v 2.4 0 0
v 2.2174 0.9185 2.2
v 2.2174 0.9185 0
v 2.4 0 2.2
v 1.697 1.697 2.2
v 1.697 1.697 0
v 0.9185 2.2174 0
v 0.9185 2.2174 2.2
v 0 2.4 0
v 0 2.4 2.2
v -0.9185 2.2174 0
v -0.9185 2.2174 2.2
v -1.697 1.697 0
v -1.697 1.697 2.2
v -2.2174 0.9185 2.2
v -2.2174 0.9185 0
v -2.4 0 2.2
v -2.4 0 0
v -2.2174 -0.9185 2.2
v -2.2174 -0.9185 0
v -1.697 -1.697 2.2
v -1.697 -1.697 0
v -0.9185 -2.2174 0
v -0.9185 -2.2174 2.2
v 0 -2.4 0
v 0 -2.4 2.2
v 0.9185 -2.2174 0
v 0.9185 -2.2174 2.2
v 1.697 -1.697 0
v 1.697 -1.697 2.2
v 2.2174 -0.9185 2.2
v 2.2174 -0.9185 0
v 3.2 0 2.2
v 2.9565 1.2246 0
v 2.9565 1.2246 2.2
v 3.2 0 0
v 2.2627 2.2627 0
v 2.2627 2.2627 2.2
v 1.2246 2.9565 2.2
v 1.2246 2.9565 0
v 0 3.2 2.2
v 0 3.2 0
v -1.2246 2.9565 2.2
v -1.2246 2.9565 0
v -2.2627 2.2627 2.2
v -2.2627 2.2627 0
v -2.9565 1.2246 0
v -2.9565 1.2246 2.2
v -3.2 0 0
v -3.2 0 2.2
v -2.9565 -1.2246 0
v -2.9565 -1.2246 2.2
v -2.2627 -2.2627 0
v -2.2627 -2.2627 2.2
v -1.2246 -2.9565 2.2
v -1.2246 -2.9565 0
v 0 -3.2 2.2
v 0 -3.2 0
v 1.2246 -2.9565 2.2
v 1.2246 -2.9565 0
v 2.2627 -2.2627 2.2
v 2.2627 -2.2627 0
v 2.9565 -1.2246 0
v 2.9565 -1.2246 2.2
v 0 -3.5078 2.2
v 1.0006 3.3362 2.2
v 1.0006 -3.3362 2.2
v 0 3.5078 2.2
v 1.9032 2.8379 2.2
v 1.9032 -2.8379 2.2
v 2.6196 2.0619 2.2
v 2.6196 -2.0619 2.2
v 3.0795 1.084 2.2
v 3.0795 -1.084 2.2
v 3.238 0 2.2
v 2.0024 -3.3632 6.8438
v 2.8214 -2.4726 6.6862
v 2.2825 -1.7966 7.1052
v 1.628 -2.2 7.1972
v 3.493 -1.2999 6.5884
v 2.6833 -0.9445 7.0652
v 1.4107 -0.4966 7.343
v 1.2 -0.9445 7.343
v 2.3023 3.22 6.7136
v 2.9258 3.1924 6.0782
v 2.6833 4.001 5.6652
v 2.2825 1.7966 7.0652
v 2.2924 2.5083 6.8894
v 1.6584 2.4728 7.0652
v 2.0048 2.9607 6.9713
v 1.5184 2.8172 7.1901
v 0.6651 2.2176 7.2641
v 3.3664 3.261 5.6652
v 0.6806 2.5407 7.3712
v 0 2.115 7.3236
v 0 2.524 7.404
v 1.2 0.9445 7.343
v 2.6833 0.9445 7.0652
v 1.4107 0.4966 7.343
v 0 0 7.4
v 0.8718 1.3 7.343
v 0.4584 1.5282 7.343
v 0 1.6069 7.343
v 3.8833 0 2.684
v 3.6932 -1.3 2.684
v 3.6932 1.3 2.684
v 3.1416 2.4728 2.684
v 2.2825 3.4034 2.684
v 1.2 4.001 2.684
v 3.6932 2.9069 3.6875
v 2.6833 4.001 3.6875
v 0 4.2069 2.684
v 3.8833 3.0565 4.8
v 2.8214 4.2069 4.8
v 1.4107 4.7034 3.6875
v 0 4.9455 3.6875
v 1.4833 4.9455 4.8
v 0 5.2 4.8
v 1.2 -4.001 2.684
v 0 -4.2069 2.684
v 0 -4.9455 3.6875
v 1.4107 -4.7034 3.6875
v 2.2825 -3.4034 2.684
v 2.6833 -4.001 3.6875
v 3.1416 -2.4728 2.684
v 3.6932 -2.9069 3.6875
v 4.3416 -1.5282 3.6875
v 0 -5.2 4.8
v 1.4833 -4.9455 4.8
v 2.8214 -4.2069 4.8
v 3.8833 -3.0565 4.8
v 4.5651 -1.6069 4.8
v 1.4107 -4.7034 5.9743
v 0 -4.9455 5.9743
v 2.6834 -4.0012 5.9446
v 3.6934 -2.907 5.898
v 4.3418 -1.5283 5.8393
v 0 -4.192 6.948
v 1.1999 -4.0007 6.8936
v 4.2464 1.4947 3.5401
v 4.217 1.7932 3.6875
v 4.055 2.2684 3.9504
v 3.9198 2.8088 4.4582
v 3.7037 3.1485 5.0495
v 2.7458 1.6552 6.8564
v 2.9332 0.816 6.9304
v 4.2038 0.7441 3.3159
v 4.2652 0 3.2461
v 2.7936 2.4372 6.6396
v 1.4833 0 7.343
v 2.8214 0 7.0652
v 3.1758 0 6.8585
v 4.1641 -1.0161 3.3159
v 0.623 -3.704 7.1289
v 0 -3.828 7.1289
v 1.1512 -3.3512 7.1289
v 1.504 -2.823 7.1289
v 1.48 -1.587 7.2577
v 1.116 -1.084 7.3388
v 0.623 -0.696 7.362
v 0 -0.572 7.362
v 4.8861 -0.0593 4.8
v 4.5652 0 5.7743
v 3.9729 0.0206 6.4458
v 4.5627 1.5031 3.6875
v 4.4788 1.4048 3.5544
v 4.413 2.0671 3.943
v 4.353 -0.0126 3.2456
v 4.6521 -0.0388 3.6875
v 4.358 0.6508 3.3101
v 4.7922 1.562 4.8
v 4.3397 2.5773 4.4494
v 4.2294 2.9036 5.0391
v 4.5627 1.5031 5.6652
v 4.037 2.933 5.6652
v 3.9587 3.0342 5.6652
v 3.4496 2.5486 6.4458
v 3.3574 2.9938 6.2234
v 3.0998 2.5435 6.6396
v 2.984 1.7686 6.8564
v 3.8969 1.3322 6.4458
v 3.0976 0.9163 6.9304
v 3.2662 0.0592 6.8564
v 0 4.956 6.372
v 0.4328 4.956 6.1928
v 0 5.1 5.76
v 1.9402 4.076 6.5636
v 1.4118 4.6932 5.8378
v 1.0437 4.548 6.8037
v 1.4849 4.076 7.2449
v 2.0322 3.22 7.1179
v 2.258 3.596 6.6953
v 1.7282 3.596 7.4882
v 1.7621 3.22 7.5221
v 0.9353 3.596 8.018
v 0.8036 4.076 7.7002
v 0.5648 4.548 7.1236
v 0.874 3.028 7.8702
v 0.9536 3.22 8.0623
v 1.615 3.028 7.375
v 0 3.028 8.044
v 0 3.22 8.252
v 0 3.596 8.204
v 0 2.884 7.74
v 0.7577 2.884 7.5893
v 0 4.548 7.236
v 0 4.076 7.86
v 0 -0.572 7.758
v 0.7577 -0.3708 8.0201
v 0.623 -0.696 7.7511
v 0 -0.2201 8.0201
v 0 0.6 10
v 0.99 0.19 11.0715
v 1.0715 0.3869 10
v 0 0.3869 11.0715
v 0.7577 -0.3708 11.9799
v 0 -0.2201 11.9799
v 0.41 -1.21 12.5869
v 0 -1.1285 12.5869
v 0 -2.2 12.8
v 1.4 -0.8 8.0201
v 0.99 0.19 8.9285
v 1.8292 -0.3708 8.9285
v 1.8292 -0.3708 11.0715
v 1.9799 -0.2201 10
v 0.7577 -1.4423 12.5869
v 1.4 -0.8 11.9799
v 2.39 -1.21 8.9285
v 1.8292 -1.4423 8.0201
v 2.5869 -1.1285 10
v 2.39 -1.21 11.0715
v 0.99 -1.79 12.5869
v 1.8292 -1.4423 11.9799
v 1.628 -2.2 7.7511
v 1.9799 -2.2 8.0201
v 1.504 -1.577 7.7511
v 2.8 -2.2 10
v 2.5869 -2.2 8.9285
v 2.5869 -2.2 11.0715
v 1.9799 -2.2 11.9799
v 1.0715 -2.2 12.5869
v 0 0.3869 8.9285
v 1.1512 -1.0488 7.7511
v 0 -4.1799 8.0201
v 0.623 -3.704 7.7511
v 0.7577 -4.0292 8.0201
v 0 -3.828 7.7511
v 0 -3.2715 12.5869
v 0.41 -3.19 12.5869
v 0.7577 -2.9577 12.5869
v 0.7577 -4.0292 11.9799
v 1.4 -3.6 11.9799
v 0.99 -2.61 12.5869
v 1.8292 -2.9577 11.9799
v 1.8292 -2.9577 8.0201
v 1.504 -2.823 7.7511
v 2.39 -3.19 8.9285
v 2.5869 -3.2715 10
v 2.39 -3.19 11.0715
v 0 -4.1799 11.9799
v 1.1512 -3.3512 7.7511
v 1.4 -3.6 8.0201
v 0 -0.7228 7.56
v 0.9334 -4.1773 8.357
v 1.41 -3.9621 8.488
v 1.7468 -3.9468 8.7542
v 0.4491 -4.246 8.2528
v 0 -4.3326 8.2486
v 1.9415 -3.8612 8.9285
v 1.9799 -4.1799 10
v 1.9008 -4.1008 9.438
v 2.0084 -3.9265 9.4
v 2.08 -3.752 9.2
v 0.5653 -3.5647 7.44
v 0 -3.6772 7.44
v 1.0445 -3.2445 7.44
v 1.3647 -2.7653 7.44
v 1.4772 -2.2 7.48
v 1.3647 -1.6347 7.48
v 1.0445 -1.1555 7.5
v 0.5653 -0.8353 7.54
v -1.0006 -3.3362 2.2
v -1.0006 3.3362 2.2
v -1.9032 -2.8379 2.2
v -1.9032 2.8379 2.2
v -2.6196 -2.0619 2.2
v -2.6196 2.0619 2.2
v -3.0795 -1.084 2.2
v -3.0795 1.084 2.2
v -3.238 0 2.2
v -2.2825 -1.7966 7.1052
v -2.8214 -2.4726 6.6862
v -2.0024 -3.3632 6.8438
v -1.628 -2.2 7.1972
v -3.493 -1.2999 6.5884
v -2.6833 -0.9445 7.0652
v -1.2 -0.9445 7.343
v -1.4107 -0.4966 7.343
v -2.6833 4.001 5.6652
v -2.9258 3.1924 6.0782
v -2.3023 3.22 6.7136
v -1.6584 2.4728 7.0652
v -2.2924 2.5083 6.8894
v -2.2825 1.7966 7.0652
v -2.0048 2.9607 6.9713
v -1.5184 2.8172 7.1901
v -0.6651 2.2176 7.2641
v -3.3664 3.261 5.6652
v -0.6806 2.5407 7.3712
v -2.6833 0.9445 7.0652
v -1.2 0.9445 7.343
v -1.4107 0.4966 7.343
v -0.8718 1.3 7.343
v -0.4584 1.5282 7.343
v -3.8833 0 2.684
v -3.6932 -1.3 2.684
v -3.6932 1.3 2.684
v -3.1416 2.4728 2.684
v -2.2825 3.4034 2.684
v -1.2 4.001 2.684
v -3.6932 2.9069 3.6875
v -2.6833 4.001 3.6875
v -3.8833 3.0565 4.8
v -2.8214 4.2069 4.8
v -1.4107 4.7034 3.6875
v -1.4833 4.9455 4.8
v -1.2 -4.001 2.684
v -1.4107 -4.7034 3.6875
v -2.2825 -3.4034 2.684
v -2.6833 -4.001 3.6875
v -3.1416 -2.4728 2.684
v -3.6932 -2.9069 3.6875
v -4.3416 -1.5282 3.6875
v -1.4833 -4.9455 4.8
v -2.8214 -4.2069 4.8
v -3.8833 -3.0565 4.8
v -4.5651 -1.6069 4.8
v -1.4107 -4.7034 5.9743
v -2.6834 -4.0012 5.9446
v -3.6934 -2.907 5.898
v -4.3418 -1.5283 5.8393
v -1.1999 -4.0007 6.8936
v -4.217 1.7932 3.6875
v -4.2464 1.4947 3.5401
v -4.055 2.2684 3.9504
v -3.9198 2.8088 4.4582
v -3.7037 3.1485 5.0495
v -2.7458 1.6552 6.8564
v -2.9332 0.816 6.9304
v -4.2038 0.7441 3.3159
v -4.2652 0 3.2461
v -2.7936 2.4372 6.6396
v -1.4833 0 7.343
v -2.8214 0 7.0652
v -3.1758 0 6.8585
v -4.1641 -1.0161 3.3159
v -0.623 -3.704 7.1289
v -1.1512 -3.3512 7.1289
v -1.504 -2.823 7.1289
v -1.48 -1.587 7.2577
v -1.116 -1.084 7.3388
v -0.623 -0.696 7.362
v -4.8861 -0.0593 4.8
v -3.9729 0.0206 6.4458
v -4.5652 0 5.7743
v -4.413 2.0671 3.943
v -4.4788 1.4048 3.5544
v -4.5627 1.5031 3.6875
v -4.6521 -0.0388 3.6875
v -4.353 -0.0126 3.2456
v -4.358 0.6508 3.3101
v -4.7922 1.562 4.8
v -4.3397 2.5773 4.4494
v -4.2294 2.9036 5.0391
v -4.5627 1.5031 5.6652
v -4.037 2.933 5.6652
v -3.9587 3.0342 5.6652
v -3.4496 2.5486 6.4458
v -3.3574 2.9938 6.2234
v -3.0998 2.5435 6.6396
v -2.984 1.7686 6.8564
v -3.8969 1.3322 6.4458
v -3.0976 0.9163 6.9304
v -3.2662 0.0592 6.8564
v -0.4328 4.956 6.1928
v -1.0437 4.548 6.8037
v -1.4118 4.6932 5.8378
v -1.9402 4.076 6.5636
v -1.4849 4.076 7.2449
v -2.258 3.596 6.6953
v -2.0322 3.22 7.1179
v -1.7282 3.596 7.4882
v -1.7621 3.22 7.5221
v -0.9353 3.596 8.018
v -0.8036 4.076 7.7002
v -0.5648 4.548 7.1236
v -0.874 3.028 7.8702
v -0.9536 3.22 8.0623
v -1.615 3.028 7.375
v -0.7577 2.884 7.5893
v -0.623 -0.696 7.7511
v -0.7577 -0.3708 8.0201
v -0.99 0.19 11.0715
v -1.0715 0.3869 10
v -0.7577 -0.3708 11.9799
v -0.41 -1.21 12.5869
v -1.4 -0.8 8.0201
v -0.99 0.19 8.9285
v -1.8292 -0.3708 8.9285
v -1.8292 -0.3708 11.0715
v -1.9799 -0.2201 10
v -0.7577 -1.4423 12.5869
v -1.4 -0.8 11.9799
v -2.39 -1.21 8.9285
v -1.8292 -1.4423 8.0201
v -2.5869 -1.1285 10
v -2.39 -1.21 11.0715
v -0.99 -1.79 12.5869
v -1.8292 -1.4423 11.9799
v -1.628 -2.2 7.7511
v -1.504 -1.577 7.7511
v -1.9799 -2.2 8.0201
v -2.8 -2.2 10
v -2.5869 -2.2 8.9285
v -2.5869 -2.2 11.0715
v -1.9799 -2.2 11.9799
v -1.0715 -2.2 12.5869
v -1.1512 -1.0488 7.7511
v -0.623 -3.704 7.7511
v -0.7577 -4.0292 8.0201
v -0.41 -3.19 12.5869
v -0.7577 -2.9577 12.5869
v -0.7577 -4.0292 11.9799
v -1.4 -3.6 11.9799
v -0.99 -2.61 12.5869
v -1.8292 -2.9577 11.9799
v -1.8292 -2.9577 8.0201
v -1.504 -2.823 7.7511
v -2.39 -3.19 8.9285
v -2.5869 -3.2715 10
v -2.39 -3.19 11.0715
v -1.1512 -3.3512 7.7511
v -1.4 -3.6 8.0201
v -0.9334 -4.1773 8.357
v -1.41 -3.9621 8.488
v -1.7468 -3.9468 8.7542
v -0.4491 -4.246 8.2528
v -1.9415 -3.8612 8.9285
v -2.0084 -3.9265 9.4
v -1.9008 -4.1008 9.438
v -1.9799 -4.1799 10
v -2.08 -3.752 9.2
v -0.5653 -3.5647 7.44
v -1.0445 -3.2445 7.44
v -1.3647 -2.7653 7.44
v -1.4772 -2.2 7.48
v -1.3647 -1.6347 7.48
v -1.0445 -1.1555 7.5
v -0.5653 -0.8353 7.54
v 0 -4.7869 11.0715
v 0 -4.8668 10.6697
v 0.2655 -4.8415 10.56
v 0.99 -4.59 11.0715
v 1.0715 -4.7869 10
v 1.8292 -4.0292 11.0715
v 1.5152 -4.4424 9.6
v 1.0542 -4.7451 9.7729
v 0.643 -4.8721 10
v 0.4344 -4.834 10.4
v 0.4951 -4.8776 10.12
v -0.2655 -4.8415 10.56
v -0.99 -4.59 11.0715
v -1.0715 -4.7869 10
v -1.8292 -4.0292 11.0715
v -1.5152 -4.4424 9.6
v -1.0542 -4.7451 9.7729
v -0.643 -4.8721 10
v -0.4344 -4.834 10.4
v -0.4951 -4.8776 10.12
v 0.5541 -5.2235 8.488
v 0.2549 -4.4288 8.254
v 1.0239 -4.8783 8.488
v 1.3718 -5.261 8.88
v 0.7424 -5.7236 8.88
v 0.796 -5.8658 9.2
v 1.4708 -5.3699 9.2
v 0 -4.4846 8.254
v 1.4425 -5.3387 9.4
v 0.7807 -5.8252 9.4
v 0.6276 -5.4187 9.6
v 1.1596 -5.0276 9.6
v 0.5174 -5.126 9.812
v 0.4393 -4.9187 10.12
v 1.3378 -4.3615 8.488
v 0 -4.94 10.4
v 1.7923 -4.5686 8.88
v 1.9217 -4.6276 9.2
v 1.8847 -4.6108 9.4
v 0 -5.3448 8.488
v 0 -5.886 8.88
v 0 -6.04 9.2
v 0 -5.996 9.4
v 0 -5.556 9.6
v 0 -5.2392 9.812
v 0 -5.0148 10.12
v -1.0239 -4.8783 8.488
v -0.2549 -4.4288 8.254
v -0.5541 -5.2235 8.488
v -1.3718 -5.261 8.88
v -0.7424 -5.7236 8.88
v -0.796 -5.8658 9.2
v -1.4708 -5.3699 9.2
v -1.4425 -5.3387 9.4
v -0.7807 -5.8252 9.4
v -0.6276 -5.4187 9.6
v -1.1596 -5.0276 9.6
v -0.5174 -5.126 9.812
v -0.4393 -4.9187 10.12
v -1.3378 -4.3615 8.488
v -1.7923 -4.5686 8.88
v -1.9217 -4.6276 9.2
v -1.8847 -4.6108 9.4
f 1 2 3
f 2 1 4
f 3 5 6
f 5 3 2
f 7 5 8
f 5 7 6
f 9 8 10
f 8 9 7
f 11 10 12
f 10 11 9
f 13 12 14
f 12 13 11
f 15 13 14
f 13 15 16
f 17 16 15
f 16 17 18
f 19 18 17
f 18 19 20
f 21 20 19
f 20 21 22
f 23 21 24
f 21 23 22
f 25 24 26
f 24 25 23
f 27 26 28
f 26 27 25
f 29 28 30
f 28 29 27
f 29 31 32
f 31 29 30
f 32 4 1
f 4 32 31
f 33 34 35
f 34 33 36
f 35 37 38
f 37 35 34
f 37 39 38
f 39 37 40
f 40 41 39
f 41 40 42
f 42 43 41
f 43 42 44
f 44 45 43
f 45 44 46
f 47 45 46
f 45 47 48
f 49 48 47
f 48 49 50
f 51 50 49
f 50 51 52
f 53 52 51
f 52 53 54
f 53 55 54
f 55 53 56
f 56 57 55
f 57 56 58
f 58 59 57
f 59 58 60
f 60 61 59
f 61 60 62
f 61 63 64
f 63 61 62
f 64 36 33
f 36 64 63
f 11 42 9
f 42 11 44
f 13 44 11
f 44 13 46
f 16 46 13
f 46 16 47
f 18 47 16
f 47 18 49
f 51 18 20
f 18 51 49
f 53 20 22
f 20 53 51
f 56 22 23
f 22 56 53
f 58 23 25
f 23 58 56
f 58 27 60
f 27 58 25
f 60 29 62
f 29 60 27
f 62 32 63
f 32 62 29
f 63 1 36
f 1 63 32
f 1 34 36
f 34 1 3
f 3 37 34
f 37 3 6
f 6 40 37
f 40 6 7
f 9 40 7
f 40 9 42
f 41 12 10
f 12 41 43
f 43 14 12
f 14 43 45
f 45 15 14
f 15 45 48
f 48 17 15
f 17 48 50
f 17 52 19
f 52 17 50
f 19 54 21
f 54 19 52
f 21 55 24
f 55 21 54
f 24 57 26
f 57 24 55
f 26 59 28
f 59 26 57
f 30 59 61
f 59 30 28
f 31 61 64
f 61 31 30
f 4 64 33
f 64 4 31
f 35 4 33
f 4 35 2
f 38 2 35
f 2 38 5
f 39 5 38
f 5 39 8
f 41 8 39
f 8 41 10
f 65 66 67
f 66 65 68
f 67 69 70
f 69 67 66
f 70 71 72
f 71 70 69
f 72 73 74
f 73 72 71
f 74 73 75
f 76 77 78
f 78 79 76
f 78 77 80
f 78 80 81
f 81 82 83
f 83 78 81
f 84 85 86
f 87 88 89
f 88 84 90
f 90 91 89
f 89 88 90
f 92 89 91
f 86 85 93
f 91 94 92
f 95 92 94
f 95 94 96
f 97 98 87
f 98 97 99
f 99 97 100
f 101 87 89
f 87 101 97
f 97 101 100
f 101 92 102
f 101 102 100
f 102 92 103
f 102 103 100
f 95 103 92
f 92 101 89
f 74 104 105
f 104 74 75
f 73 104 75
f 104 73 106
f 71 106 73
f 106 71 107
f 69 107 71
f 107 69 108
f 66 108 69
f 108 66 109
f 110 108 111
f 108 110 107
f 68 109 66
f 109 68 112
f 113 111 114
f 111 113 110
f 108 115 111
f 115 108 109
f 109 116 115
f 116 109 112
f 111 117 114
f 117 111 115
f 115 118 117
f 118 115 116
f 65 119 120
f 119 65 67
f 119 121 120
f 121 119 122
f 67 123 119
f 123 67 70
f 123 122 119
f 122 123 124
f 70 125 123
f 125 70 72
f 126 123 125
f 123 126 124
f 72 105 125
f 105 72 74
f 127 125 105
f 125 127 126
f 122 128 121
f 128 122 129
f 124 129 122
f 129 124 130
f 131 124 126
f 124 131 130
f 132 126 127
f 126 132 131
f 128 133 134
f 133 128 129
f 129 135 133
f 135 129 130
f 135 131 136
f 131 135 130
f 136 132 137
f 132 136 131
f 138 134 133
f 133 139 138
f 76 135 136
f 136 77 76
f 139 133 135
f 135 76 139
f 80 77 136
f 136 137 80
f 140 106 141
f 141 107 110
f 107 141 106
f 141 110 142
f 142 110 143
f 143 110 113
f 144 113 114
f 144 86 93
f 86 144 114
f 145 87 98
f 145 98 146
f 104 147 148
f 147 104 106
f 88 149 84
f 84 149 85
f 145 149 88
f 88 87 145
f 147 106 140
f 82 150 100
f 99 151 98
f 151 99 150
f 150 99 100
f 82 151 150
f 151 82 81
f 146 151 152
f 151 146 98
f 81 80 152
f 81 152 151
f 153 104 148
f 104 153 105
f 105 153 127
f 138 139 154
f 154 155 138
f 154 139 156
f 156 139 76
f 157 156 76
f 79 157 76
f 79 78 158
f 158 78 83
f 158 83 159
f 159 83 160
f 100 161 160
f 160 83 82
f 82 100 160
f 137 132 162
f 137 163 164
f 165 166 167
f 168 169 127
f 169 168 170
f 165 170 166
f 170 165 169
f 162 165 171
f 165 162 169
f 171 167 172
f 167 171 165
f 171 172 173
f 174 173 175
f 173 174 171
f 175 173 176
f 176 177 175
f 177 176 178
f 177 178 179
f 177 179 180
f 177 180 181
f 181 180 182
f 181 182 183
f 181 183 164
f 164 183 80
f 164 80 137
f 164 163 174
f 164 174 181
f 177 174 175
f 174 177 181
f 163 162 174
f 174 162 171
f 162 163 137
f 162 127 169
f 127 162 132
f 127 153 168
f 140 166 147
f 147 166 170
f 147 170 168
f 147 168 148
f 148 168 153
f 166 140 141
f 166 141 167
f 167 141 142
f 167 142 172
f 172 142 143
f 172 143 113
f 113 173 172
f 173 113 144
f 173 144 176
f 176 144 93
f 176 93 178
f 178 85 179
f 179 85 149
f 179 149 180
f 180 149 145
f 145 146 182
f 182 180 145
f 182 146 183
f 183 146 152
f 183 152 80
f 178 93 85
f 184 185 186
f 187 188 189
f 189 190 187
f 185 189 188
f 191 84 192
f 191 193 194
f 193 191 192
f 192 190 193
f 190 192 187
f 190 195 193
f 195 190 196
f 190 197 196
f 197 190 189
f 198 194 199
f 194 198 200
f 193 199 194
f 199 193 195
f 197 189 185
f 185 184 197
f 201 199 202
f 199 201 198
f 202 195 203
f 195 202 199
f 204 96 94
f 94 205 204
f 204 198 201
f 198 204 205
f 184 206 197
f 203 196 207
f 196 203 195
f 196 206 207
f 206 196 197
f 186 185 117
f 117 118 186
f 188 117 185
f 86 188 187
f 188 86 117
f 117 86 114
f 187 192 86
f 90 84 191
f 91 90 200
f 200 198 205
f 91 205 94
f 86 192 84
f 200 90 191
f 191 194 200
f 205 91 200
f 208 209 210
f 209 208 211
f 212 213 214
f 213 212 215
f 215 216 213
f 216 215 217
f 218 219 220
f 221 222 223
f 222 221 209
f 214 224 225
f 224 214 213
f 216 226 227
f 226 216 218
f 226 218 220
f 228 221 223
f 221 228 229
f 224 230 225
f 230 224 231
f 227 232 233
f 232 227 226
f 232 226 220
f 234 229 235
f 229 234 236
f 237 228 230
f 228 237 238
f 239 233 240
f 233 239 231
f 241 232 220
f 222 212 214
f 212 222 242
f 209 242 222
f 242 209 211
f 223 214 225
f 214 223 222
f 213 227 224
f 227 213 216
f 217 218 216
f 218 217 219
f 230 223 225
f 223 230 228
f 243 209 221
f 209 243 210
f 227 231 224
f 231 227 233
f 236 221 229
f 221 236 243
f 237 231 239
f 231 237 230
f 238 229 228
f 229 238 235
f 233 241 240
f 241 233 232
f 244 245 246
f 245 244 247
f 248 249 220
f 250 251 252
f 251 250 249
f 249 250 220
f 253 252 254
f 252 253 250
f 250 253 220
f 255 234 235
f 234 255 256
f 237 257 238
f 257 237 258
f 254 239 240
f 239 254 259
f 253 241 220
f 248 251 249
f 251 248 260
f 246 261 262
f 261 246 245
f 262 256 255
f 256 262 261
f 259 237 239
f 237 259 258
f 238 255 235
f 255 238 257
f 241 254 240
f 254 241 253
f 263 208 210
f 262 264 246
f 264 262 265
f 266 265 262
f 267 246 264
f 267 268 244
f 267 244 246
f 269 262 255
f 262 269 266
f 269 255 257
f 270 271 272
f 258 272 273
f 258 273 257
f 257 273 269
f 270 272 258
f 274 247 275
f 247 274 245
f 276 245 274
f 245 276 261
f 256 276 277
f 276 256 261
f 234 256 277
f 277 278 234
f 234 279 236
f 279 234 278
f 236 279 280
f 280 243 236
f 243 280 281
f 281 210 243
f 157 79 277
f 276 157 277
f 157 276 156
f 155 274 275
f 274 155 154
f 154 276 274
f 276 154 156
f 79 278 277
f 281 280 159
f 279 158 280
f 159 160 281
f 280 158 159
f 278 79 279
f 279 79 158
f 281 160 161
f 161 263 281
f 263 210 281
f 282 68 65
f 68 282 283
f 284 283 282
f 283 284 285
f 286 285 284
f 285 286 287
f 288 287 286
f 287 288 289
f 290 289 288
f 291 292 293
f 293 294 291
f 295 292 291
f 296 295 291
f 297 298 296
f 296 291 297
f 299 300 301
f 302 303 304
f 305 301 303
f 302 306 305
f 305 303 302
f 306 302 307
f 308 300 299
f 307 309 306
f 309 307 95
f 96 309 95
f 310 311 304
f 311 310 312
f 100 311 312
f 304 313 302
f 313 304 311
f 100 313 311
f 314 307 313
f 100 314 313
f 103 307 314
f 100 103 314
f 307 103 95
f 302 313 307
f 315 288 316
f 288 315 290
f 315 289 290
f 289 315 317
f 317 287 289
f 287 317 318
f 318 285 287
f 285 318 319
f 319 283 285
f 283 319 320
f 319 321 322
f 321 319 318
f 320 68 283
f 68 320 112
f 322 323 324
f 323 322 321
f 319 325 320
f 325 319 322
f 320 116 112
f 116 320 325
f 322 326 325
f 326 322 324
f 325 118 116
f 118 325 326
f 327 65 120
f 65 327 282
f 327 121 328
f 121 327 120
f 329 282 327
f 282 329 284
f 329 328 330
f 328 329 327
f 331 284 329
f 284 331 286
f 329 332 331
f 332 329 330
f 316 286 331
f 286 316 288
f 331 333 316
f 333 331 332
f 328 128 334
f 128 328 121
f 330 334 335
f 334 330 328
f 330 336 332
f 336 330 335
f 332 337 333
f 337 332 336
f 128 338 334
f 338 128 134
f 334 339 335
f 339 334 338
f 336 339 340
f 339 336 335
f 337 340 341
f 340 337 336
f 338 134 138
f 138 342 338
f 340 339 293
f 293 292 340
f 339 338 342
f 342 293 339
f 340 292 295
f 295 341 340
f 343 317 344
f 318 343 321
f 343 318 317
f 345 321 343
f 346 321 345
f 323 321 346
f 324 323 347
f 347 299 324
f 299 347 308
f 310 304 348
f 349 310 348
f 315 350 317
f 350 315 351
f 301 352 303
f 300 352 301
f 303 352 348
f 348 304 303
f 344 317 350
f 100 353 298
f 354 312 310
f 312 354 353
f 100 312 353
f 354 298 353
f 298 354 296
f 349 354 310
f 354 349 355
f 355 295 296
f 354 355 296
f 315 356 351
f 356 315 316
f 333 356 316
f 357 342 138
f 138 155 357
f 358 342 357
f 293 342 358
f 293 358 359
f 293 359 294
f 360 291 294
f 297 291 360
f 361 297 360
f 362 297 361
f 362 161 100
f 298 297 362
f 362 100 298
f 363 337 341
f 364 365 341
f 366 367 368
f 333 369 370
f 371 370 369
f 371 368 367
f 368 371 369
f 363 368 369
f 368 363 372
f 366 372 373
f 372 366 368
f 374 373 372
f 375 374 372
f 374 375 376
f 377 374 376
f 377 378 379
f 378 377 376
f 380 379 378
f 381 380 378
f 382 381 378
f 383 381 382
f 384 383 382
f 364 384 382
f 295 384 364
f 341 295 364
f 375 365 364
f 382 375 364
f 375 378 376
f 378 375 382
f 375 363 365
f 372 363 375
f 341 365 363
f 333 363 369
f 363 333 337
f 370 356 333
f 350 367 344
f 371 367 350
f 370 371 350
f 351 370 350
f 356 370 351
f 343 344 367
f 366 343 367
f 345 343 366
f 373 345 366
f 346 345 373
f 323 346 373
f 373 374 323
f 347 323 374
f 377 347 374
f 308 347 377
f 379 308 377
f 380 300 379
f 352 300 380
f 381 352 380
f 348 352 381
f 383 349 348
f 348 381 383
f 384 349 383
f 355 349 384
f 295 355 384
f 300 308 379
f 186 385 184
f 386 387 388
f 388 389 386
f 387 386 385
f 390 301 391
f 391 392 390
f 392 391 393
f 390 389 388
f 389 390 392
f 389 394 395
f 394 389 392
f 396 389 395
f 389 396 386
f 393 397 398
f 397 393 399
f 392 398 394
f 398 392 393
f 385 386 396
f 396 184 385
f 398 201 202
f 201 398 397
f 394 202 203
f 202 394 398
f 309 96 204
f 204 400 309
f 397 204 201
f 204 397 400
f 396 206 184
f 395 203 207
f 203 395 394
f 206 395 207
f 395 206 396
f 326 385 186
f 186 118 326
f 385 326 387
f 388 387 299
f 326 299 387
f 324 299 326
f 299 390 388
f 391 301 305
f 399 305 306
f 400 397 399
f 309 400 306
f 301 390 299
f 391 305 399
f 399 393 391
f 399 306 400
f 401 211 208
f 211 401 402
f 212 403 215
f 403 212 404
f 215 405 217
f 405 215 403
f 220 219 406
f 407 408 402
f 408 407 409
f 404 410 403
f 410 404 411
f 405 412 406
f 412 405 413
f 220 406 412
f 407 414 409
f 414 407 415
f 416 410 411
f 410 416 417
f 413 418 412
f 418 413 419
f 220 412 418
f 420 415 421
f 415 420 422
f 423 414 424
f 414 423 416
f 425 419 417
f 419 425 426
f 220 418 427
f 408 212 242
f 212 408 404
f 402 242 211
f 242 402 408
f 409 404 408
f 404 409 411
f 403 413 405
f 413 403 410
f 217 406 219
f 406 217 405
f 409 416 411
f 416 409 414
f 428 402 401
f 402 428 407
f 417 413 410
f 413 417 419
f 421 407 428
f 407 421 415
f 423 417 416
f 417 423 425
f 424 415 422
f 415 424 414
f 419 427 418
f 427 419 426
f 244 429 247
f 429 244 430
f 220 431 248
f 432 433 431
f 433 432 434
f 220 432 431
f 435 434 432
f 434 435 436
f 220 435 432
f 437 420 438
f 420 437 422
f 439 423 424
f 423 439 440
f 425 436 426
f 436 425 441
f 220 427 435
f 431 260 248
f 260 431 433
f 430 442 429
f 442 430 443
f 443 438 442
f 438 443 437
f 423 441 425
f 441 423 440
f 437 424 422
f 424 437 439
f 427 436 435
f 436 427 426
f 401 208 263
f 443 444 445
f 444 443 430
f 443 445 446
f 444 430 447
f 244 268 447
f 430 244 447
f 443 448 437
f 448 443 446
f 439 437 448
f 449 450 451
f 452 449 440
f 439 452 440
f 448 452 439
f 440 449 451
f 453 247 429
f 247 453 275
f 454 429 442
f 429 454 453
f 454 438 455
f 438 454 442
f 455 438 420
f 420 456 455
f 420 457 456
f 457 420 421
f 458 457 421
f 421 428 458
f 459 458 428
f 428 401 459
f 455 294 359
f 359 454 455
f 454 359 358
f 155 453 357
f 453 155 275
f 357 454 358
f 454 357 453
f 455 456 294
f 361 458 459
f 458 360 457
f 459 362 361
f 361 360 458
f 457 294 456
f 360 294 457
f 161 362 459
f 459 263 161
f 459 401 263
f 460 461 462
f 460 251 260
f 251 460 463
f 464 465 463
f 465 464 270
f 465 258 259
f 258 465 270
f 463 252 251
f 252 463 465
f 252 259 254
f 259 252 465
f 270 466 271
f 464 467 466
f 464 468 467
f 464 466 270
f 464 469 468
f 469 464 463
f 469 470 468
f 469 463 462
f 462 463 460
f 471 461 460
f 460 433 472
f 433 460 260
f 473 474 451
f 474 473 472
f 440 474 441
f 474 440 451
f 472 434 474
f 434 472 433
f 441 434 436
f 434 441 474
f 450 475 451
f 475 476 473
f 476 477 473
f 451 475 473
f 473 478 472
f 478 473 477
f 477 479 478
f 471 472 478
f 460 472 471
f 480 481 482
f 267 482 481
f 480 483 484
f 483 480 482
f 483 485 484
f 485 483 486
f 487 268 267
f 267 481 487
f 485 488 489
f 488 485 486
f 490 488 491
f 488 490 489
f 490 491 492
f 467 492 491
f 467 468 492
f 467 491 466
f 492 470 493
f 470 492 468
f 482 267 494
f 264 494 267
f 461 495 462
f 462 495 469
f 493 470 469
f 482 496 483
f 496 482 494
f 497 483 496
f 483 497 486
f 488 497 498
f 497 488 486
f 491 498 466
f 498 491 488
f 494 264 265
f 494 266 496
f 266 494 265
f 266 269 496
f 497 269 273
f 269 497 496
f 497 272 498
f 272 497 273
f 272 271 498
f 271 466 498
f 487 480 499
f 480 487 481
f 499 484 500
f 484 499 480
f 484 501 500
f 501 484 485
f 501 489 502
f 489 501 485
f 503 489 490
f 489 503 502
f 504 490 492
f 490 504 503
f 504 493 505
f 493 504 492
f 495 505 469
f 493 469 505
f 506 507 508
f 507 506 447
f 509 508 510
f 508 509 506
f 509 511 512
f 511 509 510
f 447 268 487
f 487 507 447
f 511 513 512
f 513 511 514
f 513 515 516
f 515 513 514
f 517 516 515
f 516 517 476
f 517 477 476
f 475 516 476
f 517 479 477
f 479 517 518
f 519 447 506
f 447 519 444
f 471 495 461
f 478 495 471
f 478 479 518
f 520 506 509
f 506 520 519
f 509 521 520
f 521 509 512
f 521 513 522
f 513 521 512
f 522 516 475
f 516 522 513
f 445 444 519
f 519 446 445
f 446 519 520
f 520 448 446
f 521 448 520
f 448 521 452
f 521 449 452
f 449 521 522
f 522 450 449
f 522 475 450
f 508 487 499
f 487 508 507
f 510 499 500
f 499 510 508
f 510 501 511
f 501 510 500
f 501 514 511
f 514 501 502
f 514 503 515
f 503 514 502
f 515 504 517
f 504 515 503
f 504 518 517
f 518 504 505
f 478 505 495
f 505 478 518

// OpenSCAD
use <../lib.scad>
use <s/49661s01.scad>
use <s/49661s03.scad>
use <s/49661s04.scad>
function ldraw_lib__49661p04() = [
// 0 Animal Duckling with Orange Beak Pattern
// 0 Name: 49661p04.dat
// 0 Author: Vincent Messenet [Cheenzo]
// 0 !LDRAW_ORG Part UPDATE 2024-07
// 0 !LICENSE Licensed under CC BY 4.0 : see CAreadme.txt
// 
// 0 BFC CERTIFY CCW
  [0,"BFC","CERTIFY"],
  [0,"BFC","CCW"],
// 
// 0 !KEYWORDS Bath, Bricklink 49661pb04, Rebrickable 49661pr0004, Rubber Duck
// 0 !KEYWORDS Set 71429, Set 76271
// 
// 0 !HISTORY 2024-08-26 [OrionP] Official Update 2024-07
// 
// 1 16 0 0 0 1 0 0 0 1 0 0 0 1 s\49661s01.dat
  [1,16,0,0,0,1,0,0,0,1,0,0,0,1, ldraw_lib__s__49661s01()],
// 1 16 0 0 0 1 0 0 0 1 0 0 0 1 s\49661s04.dat
  [1,16,0,0,0,1,0,0,0,1,0,0,0,1, ldraw_lib__s__49661s04()],
// 1 16 0 0 0 -1 0 0 0 1 0 0 0 1 s\49661s04.dat
  [1,16,0,0,0,-1,0,0,0,1,0,0,0,1, ldraw_lib__s__49661s04()],
// 1 25 0 0 0 1 0 0 0 1 0 0 0 1 s\49661s03.dat
  [1,25,0,0,0,1,0,0,0,1,0,0,0,1, ldraw_lib__s__49661s03()],
// 1 25 0 0 0 -1 0 0 0 1 0 0 0 1 s\49661s03.dat
  [1,25,0,0,0,-1,0,0,0,1,0,0,0,1, ldraw_lib__s__49661s03()],
];
module ldraw_lib__49661p04(step=0, col=false, unit=2/5, alt=false, line=0.2, solid=!$preview)
    makepoly(ldraw_lib__49661p04(), step=step, col=col, unit=unit, alt=alt, line=line, solid=solid);
ldraw_lib__49661p04(line=0.2);
